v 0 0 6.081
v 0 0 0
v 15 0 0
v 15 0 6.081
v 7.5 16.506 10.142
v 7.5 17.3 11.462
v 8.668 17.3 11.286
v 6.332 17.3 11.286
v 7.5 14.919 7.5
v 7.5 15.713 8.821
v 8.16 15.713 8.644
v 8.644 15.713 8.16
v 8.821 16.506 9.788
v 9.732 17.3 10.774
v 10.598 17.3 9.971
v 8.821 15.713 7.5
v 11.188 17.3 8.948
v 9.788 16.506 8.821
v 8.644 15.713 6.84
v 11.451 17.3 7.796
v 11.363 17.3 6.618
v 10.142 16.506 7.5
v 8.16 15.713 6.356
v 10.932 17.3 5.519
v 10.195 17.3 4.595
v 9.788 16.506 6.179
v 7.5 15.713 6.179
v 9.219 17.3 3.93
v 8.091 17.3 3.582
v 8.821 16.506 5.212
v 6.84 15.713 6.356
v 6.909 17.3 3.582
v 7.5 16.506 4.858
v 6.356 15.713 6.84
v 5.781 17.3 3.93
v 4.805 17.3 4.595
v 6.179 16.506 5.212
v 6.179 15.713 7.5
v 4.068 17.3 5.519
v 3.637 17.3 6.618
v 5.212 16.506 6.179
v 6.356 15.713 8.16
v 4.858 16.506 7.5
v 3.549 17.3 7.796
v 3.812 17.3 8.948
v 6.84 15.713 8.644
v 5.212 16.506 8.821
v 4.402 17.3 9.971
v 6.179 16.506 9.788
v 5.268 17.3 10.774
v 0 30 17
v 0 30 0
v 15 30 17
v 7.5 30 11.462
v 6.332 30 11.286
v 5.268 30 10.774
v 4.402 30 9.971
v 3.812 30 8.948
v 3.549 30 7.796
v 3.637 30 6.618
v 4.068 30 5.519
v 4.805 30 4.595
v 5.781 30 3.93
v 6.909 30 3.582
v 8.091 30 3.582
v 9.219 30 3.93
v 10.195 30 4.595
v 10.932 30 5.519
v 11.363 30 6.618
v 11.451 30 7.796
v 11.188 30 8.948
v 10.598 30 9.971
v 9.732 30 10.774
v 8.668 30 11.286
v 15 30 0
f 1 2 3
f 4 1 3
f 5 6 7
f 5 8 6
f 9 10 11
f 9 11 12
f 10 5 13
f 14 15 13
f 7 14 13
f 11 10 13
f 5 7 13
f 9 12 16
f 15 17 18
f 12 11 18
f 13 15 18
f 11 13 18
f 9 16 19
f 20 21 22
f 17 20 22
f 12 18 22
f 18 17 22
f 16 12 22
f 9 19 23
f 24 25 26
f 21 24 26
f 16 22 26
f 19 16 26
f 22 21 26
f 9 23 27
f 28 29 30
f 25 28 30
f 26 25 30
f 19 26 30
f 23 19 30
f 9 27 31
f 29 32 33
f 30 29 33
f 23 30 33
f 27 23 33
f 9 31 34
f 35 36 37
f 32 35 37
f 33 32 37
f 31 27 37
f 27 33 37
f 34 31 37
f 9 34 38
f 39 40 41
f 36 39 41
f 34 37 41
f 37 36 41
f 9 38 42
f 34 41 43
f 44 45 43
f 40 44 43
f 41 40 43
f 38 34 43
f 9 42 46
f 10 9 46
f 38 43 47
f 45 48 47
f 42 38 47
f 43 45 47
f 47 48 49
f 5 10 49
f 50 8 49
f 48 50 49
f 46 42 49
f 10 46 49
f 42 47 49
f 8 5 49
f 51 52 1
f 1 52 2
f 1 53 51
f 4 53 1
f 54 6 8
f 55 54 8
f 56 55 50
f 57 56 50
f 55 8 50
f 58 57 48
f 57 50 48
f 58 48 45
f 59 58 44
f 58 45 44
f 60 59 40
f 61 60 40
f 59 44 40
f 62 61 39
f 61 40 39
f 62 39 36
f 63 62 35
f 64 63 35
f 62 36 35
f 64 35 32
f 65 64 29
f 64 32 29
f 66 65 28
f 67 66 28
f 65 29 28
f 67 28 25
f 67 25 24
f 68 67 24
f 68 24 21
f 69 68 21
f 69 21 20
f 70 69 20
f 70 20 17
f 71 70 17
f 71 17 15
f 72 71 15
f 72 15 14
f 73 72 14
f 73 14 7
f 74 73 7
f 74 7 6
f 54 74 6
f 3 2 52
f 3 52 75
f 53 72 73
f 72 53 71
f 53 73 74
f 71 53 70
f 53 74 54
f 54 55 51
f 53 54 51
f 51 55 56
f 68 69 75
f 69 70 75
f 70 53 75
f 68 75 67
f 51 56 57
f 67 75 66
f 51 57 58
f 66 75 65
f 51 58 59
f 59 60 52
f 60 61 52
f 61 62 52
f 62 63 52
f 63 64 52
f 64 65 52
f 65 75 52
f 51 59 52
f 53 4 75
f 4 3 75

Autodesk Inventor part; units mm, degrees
ref_plane "YZ Plane" through (0, 0, 0) normal (1, 0, 0) x (0, 1, 0)
ref_plane "XZ Plane" through (0, 0, 0) normal (0, 1, 0) x (-1, 0, 0)
ref_plane "XY Plane" through (0, 0, 0) normal (0, 0, 1) x (1, 0, 0)
sketch "Sketch1" plane through (0, 0, 0) normal (0, 0, 1) x (1, 0, 0)
  line L0 (0, 0) -> (15, 0)
  line L1 (15, 0) -> (15, 30)
  line L2 (15, 30) -> (0, 30)
  line L3 (0, 30) -> (0, 0)
  dimension "d0" = 30
  dimension "d1" = 15
extrude "Extrusion1" add sketch "Sketch1" along normal blind 17
sketch "Sketch2" plane through (15, 0, 0) normal (1, 0, 0) x (0, 0, -1)
  line L0 (-17, 0) -> (-17, 30) projected
  line L1 (-17, 30) -> (-6.0809, 0)
  line L2 (-17, 30) -> (14.9253, 30) construction
  line L3 (-6.0809, 0) -> (-17, 0)
  line L4 (-6.0809, 0) -> (-17, 0)
  line L5 (-17, 30) -> (-17, 0)
  dimension "d4" = 70
extrude "Extrusion2" cut sketch "Sketch2" against normal through all
sketch "Sketch3" plane through (0, 30, 0) normal (0, 1, 0) x (1, 0, 0)
  circle A0 centre (7.5, -7.5) radius 3.9624
  line L0 (15, -17) -> (0, -17) construction
  line L1 (7.5, -17) -> (7.5, 2) construction
  line L2 (0, 0) -> (0, -17) construction
  line L3 (0, -8.5) -> (15, -8.5) construction
  dimension "d7" = 7.9248
hole "Hole1" at (7.5, 30, 7.5) direction (0, -1, 0) diameter 7.9248 depth 12.7 tip angle 118
properties part number "Halter"
